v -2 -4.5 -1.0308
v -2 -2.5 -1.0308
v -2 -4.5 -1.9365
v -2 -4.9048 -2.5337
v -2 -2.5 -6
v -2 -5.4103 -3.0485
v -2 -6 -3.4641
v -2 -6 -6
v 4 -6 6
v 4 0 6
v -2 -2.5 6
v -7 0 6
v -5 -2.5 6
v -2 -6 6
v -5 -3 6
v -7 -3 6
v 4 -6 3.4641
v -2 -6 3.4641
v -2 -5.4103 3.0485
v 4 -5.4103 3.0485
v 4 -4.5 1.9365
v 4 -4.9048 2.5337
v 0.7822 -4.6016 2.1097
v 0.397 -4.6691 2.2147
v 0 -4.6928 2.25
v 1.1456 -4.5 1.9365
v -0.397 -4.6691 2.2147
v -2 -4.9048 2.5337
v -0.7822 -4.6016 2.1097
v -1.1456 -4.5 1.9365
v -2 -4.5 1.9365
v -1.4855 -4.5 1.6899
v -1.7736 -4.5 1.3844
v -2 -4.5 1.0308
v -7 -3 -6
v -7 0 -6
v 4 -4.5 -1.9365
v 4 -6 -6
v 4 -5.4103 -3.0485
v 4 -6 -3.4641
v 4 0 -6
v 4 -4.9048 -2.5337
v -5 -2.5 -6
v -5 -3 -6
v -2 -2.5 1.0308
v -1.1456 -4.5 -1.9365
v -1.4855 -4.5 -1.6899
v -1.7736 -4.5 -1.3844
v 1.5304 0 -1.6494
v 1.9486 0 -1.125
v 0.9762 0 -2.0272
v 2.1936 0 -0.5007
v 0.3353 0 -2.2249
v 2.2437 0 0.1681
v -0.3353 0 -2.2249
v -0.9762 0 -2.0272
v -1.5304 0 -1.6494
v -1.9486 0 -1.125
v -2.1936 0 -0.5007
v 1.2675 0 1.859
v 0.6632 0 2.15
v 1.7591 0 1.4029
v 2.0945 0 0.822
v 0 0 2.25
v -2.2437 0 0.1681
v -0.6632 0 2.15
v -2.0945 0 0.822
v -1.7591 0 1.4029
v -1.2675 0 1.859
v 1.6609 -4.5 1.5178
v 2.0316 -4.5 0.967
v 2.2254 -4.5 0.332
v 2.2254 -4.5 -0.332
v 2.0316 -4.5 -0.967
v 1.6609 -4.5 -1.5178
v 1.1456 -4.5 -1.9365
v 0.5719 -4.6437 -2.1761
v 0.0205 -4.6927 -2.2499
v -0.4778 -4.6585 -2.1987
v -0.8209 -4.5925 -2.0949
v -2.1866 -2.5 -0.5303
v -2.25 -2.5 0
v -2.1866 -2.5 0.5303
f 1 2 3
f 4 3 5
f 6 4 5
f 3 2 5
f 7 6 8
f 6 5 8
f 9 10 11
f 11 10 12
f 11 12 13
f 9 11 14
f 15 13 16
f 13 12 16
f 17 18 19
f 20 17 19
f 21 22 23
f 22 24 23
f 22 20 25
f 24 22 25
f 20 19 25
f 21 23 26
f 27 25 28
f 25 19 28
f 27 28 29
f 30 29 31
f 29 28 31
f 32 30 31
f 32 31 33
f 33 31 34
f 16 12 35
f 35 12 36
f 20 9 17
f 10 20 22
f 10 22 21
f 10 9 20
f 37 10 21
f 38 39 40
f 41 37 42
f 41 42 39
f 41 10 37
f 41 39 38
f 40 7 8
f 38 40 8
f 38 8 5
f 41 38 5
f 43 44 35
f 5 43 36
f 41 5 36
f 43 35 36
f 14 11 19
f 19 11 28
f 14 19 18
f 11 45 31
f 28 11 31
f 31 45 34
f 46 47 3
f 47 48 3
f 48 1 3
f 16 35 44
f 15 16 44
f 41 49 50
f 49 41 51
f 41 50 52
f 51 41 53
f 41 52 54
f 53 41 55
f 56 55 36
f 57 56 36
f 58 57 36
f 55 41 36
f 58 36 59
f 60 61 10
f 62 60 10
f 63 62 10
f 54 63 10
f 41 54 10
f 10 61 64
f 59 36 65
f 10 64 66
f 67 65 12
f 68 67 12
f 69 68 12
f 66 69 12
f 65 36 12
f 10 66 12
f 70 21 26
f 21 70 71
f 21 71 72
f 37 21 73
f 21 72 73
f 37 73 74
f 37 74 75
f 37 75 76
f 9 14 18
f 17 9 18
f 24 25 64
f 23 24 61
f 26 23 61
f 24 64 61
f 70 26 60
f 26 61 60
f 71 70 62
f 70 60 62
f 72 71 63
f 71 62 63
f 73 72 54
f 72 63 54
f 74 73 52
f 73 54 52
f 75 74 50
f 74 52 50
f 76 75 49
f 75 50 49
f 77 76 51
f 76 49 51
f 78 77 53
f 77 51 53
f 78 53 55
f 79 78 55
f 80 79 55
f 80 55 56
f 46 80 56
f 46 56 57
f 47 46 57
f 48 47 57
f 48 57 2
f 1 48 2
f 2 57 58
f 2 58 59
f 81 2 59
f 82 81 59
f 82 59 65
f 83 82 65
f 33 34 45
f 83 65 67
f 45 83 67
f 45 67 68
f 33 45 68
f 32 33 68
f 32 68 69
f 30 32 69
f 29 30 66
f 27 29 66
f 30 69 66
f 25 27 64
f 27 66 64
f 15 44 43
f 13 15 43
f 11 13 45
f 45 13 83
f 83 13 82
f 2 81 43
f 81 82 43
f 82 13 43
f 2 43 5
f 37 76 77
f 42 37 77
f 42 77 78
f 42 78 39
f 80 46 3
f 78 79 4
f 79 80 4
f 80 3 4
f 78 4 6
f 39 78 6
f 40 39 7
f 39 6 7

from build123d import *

# Parameters (mm, degrees)
BOSS_EXTRUDE1_DEPTH      = 4
BOSS_EXTRUDE1_DEPTH_BACK = 7
CUT_EXTRUDE1_DEPTH       = 12
CUT_EXTRUDE1_DEPTH_BACK  = 12
SKETCH3_R                = 2.25
CUT_EXTRUDE2_DEPTH       = 12


with BuildPart() as part:
    # Sketch1 → Boss-Extrude1 (new, two sides: drawn at the far end of the back side and taken through both)
    with BuildSketch(Plane(origin=(0, 0, 0), x_dir=(0, 0, -1), z_dir=(1, 0, 0)).offset(-BOSS_EXTRUDE1_DEPTH_BACK)):
        with BuildLine():
            Line((6, -6), (6, 0))
            Line((6, 0), (-6, 0))
            Line((-6, 0), (-6, -6))
            Line((-6, -6), (-3.464101615, -6))
            ThreePointArc((-3.464101615, -6), (-2.802517077, -5.145898034), (-1.936491673, -4.5))
            Line((-1.936491673, -4.5), (1.936491673, -4.5))
            ThreePointArc((1.936491673, -4.5), (2.802517077, -5.145898034), (3.464101615, -6))
            Line((3.464101615, -6), (6, -6))
        make_face()
    extrude(amount=BOSS_EXTRUDE1_DEPTH + BOSS_EXTRUDE1_DEPTH_BACK)

    # Sketch2 → Cut-Extrude1 (cut, two sides: drawn at the far end of the back side and taken through both)
    with BuildSketch(Plane.XY.offset(-CUT_EXTRUDE1_DEPTH_BACK)):
        Polygon((-7, -3), (-5, -3), (-5, -2.5), (-2, -2.5), (-2, -6), (-7, -6), align=None)
    extrude(amount=CUT_EXTRUDE1_DEPTH + CUT_EXTRUDE1_DEPTH_BACK, mode=Mode.SUBTRACT)

    # Sketch3 → Cut-Extrude2 (cut, through all)
    with BuildSketch(Plane(origin=(0, 0, 0), x_dir=(1, 0, 0), z_dir=(0, 1, 0))):
        with Locations(Location((0, 0, 0), (0, 0, 270))):
            Circle(SKETCH3_R)
    extrude(amount=-CUT_EXTRUDE2_DEPTH, mode=Mode.SUBTRACT)


solid = part.part
